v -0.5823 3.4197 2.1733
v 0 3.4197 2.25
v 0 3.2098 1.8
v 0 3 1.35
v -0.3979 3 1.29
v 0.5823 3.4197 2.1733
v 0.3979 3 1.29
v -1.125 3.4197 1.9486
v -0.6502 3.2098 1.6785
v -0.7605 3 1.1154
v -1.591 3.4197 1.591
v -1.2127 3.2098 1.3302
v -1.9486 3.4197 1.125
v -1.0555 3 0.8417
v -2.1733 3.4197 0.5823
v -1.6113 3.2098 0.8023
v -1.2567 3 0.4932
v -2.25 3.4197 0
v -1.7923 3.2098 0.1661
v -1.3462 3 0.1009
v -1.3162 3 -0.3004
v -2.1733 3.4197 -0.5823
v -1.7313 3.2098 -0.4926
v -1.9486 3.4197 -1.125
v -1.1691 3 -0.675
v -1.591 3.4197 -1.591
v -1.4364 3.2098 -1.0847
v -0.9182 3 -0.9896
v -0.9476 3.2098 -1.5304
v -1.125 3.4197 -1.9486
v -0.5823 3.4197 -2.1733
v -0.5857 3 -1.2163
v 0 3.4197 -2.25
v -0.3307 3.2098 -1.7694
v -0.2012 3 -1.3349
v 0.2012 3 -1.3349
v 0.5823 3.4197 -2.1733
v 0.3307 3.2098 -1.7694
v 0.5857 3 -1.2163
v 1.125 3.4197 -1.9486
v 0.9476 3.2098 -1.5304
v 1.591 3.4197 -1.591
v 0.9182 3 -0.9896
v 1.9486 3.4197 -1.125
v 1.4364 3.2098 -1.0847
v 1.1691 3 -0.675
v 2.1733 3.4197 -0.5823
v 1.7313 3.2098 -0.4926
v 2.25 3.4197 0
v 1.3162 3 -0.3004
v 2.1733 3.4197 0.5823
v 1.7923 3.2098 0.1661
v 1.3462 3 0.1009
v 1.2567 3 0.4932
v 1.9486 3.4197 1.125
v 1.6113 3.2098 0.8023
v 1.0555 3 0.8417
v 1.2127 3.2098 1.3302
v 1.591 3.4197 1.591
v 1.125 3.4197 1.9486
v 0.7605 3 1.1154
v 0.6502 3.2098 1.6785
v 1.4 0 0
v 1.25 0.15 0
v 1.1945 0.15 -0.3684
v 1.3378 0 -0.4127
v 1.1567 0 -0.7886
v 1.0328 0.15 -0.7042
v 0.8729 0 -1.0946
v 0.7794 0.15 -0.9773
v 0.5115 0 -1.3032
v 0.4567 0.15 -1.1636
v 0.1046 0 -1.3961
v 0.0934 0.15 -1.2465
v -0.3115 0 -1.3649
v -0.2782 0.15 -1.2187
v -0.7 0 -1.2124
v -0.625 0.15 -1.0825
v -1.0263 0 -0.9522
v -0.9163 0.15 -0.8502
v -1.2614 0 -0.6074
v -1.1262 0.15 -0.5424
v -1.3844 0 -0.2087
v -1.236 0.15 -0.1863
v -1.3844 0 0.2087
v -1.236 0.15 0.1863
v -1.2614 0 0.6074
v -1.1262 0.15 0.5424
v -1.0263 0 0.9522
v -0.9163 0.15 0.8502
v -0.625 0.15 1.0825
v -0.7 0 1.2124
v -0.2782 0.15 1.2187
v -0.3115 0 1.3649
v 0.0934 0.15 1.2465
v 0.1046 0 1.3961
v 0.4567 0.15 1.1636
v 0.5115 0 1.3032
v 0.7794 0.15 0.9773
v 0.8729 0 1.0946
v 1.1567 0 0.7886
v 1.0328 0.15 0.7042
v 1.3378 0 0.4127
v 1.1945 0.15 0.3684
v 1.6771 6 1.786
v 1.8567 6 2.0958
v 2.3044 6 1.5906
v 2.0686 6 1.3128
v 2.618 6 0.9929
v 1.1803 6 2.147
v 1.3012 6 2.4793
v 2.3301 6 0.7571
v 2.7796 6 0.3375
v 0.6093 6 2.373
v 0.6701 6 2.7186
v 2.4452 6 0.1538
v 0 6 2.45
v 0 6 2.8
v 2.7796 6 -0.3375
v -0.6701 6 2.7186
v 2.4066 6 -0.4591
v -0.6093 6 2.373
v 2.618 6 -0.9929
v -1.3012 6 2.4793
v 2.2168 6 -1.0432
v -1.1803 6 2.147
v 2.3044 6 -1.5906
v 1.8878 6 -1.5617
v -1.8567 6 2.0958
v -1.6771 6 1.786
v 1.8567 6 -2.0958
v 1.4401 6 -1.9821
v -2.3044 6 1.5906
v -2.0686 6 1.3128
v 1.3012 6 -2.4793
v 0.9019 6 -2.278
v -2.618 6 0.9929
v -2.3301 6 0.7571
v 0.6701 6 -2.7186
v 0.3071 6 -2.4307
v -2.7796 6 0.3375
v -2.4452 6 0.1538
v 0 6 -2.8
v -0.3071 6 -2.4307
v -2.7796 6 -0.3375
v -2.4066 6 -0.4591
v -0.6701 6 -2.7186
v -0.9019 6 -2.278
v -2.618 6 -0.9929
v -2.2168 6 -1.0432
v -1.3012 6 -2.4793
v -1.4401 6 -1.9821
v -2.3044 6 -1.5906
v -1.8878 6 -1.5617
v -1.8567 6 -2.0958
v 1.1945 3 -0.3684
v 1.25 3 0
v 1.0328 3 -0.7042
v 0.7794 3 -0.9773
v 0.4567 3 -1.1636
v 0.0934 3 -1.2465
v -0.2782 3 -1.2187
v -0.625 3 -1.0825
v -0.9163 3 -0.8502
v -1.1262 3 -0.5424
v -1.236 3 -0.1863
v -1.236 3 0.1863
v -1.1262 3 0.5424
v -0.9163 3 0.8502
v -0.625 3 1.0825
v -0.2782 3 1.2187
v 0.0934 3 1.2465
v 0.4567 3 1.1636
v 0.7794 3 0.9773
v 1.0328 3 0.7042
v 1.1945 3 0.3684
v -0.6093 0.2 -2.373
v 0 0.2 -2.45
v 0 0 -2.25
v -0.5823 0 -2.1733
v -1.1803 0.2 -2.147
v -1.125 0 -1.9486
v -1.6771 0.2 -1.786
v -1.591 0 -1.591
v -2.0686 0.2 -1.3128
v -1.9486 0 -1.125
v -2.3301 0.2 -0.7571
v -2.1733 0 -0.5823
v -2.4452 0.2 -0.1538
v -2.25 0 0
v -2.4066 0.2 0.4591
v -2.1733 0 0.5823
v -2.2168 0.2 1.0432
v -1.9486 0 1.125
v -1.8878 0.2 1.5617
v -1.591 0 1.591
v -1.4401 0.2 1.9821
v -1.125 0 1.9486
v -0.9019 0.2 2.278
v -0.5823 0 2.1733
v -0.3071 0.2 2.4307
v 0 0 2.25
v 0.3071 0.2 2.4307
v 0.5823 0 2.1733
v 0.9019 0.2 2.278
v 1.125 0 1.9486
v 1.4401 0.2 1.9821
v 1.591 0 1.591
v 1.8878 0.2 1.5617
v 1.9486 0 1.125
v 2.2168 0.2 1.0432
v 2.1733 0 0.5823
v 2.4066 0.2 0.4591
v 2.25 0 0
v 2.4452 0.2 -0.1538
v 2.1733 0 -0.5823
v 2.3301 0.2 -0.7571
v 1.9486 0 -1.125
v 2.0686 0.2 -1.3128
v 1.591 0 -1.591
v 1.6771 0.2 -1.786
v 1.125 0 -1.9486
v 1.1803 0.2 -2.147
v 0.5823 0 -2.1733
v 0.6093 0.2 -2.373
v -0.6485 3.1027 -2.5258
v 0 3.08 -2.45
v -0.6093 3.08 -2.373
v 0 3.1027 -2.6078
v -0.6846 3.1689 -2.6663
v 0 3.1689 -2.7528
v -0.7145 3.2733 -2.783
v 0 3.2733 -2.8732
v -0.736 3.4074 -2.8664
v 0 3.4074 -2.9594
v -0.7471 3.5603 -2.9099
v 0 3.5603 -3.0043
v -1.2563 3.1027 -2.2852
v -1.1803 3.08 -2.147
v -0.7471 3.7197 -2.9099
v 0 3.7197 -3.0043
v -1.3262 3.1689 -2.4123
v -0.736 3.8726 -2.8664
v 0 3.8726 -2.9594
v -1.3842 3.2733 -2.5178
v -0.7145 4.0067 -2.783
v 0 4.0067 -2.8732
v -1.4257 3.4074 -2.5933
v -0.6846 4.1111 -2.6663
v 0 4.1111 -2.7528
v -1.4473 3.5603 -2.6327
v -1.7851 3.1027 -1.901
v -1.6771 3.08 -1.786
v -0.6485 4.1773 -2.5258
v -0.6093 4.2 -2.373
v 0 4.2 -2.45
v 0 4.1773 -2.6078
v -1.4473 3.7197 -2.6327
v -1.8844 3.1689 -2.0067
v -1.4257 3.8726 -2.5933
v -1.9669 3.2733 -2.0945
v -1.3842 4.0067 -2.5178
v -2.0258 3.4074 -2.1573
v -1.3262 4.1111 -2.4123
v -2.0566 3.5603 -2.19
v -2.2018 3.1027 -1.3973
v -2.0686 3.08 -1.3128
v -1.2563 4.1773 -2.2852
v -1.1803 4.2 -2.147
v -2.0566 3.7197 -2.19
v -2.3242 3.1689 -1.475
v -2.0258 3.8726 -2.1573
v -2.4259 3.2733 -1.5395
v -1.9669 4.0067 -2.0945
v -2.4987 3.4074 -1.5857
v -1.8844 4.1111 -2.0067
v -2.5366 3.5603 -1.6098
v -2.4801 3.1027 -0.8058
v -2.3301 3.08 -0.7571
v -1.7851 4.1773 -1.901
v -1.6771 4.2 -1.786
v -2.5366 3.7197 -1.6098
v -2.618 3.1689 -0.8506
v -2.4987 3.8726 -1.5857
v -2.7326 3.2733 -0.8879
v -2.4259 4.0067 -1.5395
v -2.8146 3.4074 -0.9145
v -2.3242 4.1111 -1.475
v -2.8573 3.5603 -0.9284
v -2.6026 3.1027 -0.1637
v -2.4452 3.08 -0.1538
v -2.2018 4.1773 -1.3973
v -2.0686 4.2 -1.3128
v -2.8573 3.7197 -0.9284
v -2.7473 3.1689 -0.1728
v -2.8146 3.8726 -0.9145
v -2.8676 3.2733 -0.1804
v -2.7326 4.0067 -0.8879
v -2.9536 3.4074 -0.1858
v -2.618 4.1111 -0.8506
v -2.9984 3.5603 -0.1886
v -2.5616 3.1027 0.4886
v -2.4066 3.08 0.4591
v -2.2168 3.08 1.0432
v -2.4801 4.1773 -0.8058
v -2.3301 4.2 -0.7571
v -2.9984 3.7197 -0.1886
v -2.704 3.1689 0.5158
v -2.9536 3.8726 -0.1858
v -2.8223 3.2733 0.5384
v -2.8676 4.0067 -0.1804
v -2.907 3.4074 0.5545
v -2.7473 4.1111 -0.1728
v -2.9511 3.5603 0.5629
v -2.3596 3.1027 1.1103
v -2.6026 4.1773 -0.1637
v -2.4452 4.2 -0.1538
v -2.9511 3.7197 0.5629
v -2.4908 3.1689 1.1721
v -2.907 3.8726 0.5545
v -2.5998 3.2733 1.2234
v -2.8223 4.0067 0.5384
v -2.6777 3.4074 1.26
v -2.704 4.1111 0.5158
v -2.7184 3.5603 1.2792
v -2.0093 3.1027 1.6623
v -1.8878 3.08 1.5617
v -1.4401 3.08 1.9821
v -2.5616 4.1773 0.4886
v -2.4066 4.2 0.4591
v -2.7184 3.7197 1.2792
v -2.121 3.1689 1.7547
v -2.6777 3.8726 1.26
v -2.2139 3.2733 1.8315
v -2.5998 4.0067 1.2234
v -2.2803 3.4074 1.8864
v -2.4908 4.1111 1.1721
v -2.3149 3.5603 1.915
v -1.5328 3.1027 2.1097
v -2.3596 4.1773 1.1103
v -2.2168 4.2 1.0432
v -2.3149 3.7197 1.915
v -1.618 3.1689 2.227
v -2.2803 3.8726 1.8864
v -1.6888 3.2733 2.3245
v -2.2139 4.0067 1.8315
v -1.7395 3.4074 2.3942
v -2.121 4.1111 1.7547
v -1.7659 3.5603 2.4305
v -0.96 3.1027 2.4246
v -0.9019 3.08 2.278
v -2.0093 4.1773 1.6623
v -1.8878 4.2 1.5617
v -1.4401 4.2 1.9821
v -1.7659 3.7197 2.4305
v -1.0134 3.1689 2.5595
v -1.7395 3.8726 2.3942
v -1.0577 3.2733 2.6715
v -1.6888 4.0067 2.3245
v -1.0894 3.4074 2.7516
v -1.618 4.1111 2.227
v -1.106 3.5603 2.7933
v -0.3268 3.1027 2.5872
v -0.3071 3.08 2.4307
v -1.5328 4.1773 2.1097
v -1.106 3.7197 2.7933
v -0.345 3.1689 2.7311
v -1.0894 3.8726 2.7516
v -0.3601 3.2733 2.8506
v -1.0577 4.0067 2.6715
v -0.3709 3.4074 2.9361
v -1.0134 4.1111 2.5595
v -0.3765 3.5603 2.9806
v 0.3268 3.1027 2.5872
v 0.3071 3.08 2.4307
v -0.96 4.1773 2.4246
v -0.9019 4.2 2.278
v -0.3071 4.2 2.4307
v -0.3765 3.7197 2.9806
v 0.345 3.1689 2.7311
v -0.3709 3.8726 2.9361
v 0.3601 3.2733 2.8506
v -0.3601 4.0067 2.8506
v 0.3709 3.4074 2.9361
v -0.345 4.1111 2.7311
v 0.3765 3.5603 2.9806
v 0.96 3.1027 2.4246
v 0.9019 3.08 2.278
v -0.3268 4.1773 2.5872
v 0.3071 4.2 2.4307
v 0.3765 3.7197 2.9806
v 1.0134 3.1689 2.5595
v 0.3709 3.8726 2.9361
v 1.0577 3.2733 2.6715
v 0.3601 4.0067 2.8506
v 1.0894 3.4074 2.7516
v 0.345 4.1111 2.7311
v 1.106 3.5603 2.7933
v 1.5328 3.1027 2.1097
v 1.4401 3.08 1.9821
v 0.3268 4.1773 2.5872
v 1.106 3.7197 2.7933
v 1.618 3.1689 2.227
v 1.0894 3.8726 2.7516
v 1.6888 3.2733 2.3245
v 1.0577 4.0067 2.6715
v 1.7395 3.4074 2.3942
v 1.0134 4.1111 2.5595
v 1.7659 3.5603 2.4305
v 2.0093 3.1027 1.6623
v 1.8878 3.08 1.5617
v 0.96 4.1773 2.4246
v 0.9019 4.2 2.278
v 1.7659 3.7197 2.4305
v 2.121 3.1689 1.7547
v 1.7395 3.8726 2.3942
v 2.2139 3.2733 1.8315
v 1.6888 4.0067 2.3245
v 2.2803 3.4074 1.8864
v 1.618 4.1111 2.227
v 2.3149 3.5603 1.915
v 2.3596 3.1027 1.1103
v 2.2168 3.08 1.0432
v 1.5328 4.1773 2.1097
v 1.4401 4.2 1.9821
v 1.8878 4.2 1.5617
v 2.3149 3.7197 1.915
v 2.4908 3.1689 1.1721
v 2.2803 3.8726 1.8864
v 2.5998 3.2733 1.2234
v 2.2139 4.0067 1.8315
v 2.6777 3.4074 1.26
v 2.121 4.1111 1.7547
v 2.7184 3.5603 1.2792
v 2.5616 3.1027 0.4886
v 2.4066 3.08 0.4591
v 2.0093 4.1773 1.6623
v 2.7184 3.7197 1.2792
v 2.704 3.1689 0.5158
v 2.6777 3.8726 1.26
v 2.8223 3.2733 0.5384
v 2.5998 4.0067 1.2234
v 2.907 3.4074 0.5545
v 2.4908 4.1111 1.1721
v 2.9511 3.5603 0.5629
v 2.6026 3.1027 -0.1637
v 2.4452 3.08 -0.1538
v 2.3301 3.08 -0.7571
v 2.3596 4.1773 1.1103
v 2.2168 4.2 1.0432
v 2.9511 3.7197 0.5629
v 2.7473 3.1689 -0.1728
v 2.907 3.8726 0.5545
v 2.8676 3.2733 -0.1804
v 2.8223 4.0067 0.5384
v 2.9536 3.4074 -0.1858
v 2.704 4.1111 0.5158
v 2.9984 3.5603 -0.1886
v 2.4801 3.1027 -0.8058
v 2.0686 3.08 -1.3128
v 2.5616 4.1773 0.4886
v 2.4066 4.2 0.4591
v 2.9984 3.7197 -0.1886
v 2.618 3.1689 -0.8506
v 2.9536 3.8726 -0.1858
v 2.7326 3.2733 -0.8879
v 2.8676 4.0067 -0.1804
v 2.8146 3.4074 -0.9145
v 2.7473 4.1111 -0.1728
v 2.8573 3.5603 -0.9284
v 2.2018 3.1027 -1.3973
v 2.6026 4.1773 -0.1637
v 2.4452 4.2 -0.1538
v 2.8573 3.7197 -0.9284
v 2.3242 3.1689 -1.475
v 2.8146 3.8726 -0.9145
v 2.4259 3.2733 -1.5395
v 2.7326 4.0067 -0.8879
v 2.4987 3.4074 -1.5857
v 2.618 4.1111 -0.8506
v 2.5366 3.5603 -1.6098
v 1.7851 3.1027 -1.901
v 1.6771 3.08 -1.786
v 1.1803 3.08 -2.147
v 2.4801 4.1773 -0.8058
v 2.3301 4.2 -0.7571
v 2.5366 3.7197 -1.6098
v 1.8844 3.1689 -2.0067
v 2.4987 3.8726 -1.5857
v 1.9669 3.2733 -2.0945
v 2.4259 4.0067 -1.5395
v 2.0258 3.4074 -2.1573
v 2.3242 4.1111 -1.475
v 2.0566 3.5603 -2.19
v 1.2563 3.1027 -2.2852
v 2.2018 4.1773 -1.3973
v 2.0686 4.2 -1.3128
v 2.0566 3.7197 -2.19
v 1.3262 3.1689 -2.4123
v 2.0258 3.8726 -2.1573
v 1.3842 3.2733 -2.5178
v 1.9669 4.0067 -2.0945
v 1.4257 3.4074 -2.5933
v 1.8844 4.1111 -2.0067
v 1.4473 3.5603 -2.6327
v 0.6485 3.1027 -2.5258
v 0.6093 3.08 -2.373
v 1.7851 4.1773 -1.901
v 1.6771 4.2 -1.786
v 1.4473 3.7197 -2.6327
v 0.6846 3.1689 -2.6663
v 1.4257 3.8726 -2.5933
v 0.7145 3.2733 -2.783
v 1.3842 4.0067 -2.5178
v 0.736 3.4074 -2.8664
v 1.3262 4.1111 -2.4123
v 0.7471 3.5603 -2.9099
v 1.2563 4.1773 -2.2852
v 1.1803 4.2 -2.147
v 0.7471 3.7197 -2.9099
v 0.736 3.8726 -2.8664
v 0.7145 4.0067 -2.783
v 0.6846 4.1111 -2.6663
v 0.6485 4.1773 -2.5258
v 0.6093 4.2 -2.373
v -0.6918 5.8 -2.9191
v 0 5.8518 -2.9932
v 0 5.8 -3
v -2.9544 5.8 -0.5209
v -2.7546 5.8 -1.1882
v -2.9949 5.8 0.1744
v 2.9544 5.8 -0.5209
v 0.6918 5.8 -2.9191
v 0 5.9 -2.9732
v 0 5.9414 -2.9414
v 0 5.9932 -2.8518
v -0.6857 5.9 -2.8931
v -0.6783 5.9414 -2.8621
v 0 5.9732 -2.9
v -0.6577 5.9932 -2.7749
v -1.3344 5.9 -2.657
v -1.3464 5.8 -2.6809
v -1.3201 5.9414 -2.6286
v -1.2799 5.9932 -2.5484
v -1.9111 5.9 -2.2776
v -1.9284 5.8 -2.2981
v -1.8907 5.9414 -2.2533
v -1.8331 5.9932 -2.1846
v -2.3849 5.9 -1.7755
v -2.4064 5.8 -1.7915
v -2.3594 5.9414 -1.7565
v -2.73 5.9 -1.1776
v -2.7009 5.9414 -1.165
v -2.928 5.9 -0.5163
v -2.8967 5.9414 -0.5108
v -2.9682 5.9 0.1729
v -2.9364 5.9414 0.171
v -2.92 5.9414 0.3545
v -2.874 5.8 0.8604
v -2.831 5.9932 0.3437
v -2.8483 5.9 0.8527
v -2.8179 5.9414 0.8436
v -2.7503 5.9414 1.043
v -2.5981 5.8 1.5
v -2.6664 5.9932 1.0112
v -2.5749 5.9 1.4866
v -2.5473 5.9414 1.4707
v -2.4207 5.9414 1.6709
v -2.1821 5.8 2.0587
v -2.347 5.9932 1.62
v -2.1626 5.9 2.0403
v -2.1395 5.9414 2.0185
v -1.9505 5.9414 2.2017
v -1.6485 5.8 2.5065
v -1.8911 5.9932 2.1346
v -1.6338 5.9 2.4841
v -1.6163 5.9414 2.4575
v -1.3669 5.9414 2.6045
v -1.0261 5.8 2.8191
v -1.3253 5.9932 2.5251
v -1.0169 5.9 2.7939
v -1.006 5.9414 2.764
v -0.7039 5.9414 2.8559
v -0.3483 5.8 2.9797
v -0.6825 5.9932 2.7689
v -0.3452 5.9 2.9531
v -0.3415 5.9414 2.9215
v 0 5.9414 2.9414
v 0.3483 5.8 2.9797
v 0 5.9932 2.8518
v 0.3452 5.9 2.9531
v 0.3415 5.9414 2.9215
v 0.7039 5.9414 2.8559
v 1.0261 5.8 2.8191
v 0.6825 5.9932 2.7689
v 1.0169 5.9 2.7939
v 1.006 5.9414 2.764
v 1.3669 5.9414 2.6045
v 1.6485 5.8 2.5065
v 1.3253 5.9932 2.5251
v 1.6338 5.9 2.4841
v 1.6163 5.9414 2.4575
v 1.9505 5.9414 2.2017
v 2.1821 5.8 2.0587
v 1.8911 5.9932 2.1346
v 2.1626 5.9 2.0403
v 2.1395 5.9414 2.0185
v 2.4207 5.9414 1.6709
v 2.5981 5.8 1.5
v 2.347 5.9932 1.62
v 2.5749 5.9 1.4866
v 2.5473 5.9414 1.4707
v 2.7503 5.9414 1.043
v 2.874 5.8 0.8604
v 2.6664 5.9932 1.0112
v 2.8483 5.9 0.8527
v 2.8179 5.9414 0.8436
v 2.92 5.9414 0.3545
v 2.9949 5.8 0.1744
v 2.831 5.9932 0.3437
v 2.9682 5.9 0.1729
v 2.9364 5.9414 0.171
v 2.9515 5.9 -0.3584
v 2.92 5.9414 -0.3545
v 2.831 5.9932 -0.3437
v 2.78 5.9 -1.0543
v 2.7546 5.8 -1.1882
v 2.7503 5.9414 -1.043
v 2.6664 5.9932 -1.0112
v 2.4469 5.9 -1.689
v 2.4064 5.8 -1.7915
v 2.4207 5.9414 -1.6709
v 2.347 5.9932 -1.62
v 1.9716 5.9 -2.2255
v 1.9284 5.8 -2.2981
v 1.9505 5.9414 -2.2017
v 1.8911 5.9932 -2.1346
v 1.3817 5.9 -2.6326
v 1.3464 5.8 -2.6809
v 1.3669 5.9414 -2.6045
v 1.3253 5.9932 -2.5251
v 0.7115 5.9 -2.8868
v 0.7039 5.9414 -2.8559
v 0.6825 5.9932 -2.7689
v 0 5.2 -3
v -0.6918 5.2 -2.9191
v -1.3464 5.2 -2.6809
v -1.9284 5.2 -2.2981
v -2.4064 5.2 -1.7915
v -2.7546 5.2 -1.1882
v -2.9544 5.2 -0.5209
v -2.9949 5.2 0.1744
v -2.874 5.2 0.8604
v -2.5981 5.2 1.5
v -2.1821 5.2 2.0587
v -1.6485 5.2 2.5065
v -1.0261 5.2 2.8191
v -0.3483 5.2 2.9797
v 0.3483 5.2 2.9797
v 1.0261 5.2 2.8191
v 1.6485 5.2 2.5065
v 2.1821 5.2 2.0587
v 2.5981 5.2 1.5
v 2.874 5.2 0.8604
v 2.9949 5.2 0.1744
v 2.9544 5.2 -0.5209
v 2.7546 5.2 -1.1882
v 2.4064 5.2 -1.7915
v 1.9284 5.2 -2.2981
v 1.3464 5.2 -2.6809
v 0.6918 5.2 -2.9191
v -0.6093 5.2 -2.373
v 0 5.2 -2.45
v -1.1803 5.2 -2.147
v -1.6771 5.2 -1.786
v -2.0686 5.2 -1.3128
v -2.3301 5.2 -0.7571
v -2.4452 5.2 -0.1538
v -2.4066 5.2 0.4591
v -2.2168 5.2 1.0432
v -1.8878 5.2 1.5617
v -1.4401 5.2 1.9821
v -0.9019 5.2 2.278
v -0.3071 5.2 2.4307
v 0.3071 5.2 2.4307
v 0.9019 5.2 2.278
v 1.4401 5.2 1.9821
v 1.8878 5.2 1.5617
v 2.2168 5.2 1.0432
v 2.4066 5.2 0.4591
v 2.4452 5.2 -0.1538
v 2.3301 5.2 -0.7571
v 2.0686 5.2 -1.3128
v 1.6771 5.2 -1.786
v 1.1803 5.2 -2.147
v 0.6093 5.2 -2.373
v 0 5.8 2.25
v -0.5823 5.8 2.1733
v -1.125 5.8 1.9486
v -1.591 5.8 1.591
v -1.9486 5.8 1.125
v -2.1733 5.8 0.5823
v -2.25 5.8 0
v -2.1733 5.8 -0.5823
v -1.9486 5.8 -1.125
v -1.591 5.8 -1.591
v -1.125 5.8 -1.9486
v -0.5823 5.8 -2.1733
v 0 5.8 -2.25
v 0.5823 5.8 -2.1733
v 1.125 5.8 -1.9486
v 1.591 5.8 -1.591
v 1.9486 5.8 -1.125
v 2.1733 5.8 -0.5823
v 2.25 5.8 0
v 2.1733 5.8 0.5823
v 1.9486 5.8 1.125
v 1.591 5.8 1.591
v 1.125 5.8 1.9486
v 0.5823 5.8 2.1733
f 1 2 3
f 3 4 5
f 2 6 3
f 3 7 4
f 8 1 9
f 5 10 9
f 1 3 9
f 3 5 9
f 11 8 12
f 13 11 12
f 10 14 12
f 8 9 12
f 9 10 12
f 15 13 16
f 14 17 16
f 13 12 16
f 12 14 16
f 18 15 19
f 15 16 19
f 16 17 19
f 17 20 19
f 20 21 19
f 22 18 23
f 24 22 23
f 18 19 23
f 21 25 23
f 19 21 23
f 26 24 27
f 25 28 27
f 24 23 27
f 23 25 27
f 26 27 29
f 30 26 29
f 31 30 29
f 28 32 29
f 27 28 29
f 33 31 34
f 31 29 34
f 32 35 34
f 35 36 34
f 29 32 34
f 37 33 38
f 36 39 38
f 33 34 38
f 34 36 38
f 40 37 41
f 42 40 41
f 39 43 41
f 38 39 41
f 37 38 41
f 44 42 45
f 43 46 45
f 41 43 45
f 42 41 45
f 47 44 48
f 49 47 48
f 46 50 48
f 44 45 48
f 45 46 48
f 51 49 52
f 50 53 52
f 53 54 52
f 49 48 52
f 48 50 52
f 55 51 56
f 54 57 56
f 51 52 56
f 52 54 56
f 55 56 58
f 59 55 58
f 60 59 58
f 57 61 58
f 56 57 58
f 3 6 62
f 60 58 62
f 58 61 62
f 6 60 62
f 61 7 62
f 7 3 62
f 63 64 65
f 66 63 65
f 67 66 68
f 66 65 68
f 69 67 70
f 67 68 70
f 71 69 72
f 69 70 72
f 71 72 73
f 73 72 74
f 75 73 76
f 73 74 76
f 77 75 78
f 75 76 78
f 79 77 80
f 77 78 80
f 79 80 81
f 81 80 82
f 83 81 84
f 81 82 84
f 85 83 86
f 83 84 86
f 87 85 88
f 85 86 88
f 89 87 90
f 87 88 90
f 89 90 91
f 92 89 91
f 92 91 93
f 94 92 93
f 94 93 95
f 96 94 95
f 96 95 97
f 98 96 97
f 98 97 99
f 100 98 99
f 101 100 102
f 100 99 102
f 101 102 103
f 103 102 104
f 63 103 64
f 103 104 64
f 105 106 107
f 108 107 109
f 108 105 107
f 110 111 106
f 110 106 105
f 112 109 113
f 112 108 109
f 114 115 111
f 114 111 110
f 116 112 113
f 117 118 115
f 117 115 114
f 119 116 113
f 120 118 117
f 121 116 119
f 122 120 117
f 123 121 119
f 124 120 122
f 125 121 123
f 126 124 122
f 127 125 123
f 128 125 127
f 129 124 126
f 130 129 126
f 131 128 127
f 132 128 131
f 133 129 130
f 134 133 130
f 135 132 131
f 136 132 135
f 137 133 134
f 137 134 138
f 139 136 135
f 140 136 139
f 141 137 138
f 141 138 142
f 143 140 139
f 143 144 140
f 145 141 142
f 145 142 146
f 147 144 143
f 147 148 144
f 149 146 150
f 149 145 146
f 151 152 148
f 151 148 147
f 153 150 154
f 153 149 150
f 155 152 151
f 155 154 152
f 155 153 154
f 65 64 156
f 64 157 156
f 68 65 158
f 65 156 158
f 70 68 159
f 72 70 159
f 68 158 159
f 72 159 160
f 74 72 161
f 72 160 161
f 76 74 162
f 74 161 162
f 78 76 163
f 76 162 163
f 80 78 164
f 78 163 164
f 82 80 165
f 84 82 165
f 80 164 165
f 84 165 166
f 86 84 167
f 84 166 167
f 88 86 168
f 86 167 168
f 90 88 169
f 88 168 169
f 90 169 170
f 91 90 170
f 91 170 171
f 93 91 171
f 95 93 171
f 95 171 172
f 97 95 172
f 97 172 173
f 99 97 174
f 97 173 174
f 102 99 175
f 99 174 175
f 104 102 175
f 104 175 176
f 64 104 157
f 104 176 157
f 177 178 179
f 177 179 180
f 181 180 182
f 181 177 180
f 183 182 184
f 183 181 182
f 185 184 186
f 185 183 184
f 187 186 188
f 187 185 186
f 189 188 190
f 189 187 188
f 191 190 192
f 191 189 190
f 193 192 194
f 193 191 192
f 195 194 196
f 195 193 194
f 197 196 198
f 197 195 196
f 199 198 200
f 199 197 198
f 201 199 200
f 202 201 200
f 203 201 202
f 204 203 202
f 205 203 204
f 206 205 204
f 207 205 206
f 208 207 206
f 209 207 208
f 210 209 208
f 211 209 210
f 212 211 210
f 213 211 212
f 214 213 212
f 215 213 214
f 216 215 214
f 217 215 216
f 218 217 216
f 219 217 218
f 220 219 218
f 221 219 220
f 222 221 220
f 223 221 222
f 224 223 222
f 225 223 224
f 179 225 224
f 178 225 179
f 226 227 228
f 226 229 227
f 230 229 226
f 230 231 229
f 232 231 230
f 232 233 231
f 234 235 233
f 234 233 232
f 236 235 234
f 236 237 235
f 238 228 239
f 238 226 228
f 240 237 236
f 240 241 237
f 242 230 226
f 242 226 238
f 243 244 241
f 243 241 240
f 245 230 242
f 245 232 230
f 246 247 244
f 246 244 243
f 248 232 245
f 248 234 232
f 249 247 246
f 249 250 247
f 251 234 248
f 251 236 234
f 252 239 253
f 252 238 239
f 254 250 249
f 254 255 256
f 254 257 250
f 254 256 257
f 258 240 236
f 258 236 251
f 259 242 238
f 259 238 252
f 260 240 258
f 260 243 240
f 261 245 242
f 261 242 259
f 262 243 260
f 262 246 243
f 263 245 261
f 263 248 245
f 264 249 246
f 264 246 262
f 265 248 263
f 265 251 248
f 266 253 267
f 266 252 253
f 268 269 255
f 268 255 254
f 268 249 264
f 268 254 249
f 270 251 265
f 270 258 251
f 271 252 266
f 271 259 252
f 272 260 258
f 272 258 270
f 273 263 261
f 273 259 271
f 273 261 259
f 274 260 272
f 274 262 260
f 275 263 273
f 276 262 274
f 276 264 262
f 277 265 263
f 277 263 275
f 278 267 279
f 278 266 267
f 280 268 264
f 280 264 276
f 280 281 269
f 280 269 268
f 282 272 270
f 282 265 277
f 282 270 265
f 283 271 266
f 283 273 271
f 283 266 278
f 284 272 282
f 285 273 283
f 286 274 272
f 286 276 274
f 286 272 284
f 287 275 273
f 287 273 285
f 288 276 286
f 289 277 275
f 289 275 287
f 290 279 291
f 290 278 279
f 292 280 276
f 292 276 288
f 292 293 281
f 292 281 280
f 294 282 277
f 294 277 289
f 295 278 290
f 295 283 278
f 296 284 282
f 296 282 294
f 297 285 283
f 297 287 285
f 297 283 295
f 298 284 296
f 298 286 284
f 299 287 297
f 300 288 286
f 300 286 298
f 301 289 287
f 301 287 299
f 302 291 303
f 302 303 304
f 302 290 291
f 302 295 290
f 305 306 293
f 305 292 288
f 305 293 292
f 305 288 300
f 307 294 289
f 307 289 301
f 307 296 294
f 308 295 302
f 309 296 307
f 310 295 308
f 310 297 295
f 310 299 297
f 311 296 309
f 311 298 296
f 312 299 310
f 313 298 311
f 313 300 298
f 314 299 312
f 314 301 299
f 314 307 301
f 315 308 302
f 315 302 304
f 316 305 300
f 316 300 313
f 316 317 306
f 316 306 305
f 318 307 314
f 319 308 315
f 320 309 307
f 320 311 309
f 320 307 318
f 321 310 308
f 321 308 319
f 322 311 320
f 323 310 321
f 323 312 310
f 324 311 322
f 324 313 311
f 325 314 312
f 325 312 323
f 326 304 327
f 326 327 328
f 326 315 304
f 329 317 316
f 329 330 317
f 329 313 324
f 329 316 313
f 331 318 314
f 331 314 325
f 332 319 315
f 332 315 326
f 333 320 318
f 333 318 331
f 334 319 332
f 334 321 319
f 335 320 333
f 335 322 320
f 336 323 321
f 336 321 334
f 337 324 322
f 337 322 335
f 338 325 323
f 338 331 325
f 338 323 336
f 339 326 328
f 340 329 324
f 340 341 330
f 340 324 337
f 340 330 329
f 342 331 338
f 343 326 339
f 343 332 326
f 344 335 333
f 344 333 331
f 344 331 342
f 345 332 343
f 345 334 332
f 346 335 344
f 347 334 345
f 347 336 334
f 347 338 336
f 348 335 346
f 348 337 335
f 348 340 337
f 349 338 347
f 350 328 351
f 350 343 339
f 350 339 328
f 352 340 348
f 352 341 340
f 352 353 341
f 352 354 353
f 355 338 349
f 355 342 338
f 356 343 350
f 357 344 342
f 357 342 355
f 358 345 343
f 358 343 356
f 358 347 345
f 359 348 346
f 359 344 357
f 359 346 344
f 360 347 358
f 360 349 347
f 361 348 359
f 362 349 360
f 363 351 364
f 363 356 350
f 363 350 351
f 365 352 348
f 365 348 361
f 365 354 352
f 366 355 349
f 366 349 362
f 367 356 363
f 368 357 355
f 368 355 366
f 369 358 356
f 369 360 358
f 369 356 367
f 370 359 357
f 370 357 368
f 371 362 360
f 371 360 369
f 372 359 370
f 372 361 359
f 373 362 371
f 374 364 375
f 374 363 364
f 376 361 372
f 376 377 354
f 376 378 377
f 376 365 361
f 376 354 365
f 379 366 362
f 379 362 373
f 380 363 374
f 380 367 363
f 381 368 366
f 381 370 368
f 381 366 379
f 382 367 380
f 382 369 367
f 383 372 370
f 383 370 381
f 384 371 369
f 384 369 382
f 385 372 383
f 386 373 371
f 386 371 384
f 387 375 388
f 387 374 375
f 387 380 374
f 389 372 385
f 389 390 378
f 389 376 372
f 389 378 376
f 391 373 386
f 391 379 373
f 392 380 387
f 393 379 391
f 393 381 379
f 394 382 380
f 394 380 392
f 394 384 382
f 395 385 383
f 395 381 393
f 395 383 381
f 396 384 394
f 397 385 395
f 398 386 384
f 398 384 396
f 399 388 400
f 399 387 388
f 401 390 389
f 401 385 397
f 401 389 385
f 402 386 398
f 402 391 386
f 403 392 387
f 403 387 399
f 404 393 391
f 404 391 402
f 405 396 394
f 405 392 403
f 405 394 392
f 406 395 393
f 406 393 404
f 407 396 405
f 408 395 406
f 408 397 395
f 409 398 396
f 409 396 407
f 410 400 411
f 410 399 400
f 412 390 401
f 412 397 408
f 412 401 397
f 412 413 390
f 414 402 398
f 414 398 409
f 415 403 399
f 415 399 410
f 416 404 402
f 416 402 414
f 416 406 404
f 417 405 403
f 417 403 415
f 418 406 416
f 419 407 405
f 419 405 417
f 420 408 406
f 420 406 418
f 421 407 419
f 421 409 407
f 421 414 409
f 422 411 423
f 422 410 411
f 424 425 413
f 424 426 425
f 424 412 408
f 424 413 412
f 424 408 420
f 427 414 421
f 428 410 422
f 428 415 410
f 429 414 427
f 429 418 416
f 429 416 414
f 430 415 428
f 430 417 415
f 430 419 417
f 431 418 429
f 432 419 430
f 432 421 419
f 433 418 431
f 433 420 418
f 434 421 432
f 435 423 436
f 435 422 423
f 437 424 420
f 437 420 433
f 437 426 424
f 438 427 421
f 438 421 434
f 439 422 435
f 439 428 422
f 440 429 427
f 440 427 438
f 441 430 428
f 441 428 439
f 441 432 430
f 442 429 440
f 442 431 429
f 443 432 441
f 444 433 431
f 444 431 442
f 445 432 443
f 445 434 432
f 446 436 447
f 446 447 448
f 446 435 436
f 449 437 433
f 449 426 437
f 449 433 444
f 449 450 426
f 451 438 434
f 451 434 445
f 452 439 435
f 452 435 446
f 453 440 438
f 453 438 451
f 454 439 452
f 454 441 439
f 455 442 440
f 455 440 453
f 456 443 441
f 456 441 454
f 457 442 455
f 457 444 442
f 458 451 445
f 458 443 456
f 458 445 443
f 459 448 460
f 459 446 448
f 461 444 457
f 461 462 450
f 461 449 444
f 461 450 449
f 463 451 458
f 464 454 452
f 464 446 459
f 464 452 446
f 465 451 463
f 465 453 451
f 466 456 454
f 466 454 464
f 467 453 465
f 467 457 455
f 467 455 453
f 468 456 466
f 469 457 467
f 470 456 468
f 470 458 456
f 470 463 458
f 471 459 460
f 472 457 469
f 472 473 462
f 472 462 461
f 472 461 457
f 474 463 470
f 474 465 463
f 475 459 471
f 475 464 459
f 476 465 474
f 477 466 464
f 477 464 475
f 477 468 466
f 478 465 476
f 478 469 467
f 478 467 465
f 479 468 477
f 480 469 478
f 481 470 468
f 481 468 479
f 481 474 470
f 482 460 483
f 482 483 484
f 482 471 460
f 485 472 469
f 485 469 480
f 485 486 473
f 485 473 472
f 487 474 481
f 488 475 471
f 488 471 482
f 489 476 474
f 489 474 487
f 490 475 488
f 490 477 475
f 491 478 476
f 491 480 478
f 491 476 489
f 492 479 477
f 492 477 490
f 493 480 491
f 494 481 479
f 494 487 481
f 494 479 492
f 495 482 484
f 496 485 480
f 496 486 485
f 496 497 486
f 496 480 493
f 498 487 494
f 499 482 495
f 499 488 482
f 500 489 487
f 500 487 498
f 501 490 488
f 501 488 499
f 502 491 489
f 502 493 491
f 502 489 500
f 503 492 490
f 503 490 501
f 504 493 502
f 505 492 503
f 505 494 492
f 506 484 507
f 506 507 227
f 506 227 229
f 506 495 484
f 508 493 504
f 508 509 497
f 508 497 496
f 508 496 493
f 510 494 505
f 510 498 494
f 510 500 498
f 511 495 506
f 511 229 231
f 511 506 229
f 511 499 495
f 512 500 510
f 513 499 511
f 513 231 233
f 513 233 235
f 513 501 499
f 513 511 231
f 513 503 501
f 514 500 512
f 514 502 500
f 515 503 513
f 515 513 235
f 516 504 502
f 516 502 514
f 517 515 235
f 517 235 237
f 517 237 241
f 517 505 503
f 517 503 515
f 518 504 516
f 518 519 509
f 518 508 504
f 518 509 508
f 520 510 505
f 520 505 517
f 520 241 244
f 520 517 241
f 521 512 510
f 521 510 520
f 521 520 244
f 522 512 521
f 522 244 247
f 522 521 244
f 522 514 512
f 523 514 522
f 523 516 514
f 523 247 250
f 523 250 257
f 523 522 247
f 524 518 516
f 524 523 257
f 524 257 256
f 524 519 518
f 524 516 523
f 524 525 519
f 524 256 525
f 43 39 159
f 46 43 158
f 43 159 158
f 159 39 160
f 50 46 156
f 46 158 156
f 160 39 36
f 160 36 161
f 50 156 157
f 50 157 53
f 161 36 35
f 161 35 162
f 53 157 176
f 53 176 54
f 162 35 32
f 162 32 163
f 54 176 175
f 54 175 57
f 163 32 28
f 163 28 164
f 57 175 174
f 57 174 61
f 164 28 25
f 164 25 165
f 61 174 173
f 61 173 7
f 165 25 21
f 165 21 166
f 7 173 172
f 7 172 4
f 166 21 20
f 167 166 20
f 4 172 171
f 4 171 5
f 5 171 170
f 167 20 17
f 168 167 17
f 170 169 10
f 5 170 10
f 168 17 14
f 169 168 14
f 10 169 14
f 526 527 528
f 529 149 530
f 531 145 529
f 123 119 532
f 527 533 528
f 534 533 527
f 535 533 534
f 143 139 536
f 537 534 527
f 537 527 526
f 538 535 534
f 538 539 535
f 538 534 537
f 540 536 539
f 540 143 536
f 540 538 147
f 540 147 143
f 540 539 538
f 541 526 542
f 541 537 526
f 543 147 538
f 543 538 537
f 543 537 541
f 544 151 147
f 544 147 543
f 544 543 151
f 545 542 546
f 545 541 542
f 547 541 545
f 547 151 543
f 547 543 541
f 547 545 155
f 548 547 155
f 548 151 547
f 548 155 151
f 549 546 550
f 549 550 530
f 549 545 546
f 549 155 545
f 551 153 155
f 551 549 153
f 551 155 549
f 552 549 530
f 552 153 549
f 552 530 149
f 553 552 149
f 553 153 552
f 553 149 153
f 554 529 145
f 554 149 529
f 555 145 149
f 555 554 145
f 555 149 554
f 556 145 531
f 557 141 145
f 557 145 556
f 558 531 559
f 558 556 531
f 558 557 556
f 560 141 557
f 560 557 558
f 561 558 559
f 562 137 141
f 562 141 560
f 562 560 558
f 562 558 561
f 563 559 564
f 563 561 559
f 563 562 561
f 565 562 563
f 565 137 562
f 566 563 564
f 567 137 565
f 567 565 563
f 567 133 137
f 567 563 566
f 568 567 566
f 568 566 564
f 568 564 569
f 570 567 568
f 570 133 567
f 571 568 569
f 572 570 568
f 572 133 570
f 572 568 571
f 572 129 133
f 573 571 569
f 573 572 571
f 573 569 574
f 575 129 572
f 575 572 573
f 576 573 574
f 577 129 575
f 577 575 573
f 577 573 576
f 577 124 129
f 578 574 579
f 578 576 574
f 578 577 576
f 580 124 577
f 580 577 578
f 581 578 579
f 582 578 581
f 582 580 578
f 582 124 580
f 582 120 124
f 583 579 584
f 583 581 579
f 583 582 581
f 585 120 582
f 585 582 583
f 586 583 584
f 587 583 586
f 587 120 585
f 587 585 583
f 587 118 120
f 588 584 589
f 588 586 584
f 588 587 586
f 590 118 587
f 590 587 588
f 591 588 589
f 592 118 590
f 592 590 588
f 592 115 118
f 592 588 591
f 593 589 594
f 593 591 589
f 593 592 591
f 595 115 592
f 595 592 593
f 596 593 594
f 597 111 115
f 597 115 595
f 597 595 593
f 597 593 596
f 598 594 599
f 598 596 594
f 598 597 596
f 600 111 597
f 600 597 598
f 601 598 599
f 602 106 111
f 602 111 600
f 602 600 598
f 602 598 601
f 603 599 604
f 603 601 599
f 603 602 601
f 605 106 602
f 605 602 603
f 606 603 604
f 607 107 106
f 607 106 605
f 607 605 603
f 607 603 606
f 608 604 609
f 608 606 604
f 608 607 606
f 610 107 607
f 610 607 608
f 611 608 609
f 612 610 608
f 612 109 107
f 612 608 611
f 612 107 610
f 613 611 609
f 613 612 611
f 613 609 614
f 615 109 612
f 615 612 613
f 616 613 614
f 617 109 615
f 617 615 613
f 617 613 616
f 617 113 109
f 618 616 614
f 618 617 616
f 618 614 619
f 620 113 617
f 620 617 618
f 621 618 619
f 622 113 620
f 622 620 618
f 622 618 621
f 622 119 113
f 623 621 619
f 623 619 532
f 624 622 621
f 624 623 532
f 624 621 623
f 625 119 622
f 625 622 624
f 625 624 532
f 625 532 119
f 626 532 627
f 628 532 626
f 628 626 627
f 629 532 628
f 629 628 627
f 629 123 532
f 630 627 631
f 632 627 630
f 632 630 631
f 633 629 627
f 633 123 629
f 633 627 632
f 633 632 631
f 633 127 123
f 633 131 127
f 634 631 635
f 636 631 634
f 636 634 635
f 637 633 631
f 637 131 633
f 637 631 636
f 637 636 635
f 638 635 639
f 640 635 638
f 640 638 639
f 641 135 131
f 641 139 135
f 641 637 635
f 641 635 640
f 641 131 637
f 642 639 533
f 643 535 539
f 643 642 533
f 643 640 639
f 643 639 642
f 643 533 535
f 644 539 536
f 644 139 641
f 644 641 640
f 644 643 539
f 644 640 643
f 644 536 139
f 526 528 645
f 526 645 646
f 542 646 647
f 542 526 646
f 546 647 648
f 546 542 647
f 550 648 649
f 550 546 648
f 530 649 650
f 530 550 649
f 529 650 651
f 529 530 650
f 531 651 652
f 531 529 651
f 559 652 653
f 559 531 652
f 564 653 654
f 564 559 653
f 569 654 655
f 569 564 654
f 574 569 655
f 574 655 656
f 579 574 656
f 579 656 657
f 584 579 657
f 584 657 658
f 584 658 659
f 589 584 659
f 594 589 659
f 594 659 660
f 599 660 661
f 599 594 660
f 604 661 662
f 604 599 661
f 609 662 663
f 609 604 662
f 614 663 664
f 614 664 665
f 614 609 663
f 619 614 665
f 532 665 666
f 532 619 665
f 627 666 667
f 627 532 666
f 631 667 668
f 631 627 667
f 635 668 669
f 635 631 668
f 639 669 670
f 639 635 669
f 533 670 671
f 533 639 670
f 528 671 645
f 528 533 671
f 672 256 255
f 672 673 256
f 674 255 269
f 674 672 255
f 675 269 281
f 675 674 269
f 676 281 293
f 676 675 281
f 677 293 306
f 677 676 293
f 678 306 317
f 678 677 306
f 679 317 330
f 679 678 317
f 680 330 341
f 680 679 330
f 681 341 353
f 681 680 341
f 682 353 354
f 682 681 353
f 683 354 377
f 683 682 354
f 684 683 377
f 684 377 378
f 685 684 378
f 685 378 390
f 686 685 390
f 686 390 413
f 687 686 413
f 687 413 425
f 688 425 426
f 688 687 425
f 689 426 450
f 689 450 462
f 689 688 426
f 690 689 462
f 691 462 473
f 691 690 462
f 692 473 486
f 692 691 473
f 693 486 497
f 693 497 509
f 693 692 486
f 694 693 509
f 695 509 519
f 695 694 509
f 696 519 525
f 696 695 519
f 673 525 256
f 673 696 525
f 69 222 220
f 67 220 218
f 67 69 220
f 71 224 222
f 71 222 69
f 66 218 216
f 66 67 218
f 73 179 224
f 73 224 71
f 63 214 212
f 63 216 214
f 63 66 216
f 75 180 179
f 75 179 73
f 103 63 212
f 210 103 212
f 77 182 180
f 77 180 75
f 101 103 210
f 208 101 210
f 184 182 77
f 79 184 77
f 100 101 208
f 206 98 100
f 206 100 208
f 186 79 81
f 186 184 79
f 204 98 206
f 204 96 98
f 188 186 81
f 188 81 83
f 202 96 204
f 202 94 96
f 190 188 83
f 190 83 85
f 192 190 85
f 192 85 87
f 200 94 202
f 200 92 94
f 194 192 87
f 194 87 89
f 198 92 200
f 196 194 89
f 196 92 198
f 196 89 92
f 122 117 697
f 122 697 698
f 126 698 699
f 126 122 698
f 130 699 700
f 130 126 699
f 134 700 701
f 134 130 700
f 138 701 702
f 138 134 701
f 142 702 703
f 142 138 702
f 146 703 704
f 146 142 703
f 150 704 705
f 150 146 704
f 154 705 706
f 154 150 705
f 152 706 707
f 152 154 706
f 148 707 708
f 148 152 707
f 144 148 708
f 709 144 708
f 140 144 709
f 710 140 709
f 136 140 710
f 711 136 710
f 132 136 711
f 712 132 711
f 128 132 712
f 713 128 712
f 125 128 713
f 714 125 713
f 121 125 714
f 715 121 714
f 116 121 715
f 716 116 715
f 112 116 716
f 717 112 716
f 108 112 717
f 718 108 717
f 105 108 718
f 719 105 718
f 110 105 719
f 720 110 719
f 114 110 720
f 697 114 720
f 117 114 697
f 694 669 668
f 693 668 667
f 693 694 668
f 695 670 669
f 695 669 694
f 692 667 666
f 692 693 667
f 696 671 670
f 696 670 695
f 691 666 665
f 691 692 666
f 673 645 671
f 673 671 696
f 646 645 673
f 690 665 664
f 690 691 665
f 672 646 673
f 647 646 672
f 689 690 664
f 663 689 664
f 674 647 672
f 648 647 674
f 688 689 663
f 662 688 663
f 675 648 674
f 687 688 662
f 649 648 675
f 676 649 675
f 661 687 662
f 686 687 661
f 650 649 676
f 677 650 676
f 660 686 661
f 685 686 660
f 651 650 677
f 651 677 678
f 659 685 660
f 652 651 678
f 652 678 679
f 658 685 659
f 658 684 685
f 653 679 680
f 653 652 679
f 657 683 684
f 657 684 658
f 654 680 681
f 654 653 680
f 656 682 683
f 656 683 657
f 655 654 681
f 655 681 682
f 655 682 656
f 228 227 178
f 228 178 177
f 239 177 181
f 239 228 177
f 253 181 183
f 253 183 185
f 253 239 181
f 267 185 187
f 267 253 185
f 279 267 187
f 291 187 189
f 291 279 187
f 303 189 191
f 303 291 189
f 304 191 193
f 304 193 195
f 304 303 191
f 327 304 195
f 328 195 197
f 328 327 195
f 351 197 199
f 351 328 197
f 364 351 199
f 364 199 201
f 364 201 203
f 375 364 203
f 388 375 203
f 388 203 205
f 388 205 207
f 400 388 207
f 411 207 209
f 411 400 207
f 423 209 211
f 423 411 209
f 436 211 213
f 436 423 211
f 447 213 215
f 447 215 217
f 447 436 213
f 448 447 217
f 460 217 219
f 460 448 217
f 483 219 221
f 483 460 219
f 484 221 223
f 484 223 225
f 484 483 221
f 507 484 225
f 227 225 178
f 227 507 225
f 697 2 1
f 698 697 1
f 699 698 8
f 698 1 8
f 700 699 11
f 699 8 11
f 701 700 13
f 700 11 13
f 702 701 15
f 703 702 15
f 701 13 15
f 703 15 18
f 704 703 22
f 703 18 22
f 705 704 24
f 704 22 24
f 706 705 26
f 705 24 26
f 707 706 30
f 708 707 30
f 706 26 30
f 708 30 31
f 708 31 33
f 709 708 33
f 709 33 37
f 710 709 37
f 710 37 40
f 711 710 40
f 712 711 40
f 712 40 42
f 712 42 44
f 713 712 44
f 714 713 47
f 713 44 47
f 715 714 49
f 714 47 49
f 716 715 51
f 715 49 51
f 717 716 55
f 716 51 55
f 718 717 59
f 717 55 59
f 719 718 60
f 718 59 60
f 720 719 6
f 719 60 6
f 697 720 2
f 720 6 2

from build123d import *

# Parameters (mm, degrees)
FILLET_2_R            = 0.2
HOLE_WIZARD_M31_D     = 2.5
HOLE_WIZARD_M31_DEPTH = 4
HOLE_WIZARD_M31_TIP   = 0.751075774
CHAMFER_2_SIZE        = 0.15
CHAMFER_3_SIZE        = 0.2
CHAMFER_6_SIZE        = 0.2


with BuildPart() as part:
    # Эскиз1 → Повернуть1 (revolve)
    with BuildSketch(Plane.XY, mode=Mode.PRIVATE) as revolve_1_sk:
        Polygon((0, 0), (2.45, 0), (2.45, 5.2), (3, 5.2), (3, 6), (0, 6), align=None)
    revolve(revolve_1_sk.sketch.rotate(Axis((0, 0, 0), (0, 1, 0)), 90), axis=Axis((0, 0, 0), (0, 1, 0)))

    # Скругление2
    fillet_2_edges = [part.edges().sort_by_distance(p)[0] for p in [
        (0, 6, 3),
    ]]
    fillet(fillet_2_edges, radius=FILLET_2_R)

    # Отверстие обработанное метчиком M31
    with Locations(Plane(origin=(0, 0, 0), x_dir=(-1, 0, 0), z_dir=(0, -1, 0))):
        with Locations((0, 0)):
            Hole(HOLE_WIZARD_M31_D / 2, depth=HOLE_WIZARD_M31_DEPTH)
            with Locations((0, 0, -(HOLE_WIZARD_M31_DEPTH + HOLE_WIZARD_M31_TIP / 2))):  # 118° drill point
                Cone(0, HOLE_WIZARD_M31_D / 2, HOLE_WIZARD_M31_TIP, mode=Mode.SUBTRACT)

    # Фаска2
    chamfer_2_edges = [part.edges().sort_by_distance(p)[0] for p in [
        (-1.25, 0, 0),
    ]]
    chamfer(chamfer_2_edges, length=CHAMFER_2_SIZE)

    # Эскиз8 → Вырез-Повернуть1 (revolve, cut)
    with BuildSketch(Plane.XY, mode=Mode.PRIVATE) as cut_revolve_1_sk:
        Polygon((2.25, 6), (2.25, 3.419676892), (1.35, 3), (0, 3), (0, 6), align=None)
    revolve(cut_revolve_1_sk.sketch.rotate(Axis((0, 6, 0), (0, -1, 0)), 90), axis=Axis((0, 6, 0), (0, -1, 0)), mode=Mode.SUBTRACT)

    # Эскиз9 → Повернуть3 (revolve)
    with BuildSketch(Plane.XY, mode=Mode.PRIVATE) as revolve_3_sk:
        with BuildLine():
            Line((-2.45, 4.2), (-2.45, 3.08))
            ThreePointArc((-2.45, 3.08), (-3.01, 3.64), (-2.45, 4.2))
        make_face()
    revolve(revolve_3_sk.sketch.rotate(Axis((0, 0, 0), (0, 1, 0)), 270), axis=Axis((0, 0, 0), (0, 1, 0)))

    # Фаска3
    chamfer_3_edges = [part.edges().sort_by_distance(p)[0] for p in [
        (0, 0, 2.45),
    ]]
    chamfer(chamfer_3_edges, length=CHAMFER_3_SIZE)

    # Фаска6
    chamfer_6_edges = [part.edges().sort_by_distance(p)[0] for p in [
        (0, 6, -2.25),
    ]]
    chamfer(chamfer_6_edges, length=CHAMFER_6_SIZE)


solid = part.part
